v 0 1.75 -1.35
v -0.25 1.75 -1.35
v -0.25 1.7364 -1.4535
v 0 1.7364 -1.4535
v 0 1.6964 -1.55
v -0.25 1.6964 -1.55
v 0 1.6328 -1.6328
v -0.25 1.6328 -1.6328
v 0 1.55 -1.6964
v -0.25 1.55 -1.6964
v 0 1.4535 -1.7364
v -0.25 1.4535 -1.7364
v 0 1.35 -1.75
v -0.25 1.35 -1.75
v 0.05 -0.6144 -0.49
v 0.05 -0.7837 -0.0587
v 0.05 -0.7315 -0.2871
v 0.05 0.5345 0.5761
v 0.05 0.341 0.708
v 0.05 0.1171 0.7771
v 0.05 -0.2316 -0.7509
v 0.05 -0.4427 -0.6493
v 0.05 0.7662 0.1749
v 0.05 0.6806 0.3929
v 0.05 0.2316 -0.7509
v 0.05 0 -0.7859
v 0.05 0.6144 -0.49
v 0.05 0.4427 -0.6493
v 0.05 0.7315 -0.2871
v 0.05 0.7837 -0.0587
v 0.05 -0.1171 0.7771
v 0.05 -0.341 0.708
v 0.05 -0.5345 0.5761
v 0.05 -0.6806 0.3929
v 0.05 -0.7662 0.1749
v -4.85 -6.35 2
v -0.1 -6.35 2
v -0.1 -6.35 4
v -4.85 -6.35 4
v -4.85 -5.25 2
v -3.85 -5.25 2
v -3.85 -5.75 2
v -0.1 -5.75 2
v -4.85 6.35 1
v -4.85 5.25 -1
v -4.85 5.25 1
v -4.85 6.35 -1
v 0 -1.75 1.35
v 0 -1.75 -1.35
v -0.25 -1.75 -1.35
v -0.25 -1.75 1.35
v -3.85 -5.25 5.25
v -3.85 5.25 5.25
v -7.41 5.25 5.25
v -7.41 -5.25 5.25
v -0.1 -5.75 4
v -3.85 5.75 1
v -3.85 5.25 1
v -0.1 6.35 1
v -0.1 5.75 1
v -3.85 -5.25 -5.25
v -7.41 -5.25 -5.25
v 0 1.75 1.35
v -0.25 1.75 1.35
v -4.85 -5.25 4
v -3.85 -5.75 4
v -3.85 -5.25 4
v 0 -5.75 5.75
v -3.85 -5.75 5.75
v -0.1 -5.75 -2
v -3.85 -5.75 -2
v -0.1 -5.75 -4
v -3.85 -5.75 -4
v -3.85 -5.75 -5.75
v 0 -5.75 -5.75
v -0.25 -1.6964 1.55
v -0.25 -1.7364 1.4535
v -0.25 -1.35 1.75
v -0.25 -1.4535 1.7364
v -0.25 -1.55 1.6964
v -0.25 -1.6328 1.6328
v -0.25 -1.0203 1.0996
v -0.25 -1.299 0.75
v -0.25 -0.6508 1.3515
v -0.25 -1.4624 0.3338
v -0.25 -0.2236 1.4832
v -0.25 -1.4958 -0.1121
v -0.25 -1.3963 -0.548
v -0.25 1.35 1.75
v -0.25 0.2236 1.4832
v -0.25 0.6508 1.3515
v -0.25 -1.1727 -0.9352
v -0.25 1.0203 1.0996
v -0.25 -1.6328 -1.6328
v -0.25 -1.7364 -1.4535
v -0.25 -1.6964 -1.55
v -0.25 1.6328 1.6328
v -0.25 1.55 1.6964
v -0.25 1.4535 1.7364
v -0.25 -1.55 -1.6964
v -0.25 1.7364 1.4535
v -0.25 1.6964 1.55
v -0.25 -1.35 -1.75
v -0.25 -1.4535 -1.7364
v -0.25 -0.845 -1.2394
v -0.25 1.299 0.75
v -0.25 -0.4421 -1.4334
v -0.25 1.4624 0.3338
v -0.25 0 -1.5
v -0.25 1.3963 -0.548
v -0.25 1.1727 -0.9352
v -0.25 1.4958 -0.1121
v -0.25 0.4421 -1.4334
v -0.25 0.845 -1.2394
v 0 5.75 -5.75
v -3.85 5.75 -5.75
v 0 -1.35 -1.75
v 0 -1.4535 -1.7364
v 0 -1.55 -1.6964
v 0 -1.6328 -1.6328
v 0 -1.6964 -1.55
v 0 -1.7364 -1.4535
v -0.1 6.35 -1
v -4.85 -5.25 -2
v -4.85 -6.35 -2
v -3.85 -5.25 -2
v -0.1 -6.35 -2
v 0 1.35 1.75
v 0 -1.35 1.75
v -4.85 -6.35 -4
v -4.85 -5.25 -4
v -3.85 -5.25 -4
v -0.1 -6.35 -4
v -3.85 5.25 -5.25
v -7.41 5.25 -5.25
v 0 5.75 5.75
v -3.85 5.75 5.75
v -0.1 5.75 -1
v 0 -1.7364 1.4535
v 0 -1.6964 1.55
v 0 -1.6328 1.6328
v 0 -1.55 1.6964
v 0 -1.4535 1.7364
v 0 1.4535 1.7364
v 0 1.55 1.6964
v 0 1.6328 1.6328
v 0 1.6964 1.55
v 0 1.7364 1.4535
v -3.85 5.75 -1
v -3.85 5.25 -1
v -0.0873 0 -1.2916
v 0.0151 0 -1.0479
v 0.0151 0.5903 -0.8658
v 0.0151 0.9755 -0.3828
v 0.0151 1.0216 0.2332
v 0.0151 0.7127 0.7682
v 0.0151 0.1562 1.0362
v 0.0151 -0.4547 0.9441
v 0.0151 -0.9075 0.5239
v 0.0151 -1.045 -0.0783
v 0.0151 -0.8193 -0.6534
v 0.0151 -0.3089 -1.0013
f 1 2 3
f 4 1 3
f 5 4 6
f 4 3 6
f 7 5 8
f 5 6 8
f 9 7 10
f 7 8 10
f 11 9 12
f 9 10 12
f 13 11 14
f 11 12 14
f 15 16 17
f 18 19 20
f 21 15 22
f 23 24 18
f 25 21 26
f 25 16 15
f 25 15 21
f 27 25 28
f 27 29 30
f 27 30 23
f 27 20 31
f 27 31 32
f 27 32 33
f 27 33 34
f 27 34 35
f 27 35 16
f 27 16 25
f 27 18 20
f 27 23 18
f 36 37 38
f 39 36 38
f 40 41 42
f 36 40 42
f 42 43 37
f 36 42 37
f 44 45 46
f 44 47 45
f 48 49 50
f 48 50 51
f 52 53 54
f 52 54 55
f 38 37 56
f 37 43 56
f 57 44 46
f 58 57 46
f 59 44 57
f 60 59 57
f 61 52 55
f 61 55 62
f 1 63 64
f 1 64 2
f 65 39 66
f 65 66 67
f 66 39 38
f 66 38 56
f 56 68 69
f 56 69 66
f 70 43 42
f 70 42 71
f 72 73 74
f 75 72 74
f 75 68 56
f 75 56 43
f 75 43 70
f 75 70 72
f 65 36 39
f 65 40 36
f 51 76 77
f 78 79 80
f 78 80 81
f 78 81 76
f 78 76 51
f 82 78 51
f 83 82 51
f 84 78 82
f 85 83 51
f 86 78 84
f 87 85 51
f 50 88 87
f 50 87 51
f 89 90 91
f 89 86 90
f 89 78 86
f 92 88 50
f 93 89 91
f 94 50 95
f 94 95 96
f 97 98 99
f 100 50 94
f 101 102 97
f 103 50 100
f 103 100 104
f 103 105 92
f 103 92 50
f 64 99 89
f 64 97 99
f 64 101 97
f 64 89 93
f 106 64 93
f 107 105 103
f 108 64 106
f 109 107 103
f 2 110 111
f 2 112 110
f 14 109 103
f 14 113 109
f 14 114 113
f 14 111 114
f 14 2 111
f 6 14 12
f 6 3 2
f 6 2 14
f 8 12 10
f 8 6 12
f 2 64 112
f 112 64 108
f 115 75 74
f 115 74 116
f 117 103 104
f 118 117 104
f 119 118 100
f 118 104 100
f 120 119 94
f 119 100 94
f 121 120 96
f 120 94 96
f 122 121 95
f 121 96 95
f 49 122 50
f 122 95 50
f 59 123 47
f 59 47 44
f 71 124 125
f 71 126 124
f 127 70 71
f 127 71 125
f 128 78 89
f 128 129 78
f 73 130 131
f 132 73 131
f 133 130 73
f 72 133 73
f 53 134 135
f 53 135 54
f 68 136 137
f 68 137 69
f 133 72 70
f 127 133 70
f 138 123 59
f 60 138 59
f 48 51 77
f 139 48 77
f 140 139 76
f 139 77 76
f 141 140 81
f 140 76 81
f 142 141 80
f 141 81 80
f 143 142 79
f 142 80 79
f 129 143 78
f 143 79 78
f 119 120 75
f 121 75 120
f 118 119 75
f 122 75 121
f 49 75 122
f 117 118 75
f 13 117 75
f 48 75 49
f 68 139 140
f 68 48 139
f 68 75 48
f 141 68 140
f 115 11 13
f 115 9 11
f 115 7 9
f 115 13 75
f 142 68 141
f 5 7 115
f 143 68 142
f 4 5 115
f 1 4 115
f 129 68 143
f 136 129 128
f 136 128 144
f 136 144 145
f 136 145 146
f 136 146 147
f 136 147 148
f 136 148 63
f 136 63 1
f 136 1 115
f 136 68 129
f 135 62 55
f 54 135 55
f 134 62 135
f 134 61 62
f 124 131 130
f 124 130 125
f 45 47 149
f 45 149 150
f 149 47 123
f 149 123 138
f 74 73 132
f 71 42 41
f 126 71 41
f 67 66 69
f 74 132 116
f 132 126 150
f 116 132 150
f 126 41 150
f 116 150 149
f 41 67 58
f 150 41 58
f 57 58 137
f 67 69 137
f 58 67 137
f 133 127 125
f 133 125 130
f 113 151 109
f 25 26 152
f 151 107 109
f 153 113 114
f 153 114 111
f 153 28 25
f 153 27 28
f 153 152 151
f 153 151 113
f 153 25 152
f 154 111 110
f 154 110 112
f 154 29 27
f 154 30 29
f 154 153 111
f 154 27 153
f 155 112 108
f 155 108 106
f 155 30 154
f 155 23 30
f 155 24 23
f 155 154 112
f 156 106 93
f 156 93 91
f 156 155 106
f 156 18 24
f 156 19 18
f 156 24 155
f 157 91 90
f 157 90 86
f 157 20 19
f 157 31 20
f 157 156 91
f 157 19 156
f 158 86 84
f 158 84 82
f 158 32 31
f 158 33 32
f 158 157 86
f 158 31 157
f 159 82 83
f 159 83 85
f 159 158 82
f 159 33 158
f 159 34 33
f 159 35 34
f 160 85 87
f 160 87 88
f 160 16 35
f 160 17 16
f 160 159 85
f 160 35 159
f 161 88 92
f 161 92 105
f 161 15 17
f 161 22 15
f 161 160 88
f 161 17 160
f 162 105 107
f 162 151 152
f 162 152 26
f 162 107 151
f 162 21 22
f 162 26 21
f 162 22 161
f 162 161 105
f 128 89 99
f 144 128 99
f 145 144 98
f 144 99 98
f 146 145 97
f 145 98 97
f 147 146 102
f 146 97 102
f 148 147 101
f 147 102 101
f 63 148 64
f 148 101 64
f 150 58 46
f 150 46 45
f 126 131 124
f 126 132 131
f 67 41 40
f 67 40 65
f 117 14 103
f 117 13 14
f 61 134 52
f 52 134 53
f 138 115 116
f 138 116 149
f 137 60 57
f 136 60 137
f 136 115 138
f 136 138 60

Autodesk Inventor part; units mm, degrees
ref_plane "YZ Plane" through (0, 0, 0) normal (1, 0, 0) x (0, 1, 0)
ref_plane "XZ Plane" through (0, 0, 0) normal (0, 1, 0) x (-1, 0, 0)
ref_plane "XY Plane" through (0, 0, 0) normal (0, 0, 1) x (1, 0, 0)
sketch "Sketch1" plane through (0, 0, 0) normal (1, 0, 0) x (0, 1, 0)
  line L0 (5.75, 5.75) -> (-5.75, 5.75)
  line L1 (-5.75, 5.75) -> (-5.75, -5.75)
  line L2 (-5.75, -5.75) -> (5.75, -5.75)
  line L3 (5.75, -5.75) -> (5.75, 5.75)
  line L4 (5.75, 5.75) -> (-5.75, -5.75) construction
  line L5 (-5.75, 5.75) -> (5.75, -5.75) construction
  point P0 (0, 0)
  dimension "d0" = 11.5
  dimension "d1" = 11.5
extrude "Extrusion1" add sketch "Sketch1" against normal blind 3.85
sketch "Sketch2" plane through (-3.85, 0, 0) normal (-1, 0, 0) x (0, 0, 1)
  line L0 (-5.25, 5.25) -> (5.25, 5.25)
  line L1 (5.25, 5.25) -> (5.25, -5.25)
  line L2 (5.25, -5.25) -> (-5.25, -5.25)
  line L3 (-5.25, -5.25) -> (-5.25, 5.25)
  line L4 (-5.25, 5.25) -> (5.25, -5.25) construction
  line L5 (5.25, 5.25) -> (-5.25, -5.25) construction
  point P0 (0, 0)
  dimension "d4" = 10.5
  dimension "d5" = 10.5
extrude "Extrusion2" add sketch "Sketch2" along normal blind 3.56 separate body
sketch "Sketch3" plane through (-3.85, 0, 0) normal (-1, 0, 0) x (0, 0, 1)
  line L0 (5.75, 5.75) -> (-5.75, 5.75) projected
  line L1 (0, 5.75) -> (0, 5.25) construction
  line L2 (5.25, 5.25) -> (-5.25, 5.25) construction
  line L3 (0, 6.35) -> (-1, 6.35)
  line L4 (-1, 6.35) -> (-1, 5.25)
  line L5 (0, 6.35) -> (1, 6.35)
  line L6 (1, 6.35) -> (1, 5.25)
  line L7 (-1, 5.25) -> (1, 5.25) construction
  line L8 (-5.25, -5.25) -> (5.25, -5.25) projected
  line L9 (-4, -5.25) -> (-2, -5.25)
  line L10 (-2, -5.25) -> (-2, -6.35)
  line L11 (-2, -6.35) -> (-4, -6.35)
  line L12 (-4, -6.35) -> (-4, -5.25)
  line L13 (-5.25, 5.25) -> (-5.25, -5.25) projected
  line L14 (4, -5.25) -> (2, -5.25)
  line L15 (2, -5.25) -> (2, -6.35)
  line L16 (2, -6.35) -> (4, -6.35)
  line L17 (4, -6.35) -> (4, -5.25)
  line L18 (-1, 6.35) -> (1, 6.35)
  line L19 (1, 6.35) -> (1, 5.25)
  line L20 (1, 5.25) -> (-1, 5.25)
  line L21 (-1, 5.25) -> (-1, 6.35)
  point P0 (0, 0)
  dimension "d8" = 1
  dimension "d9" = 1.1
  dimension "d10" = 2
  dimension "d11" = 1.1
  dimension "d12" = 1.25
  dimension "d13" = 12.7
extrude "Extrusion3" add sketch "Sketch3" along normal blind 1 and the other way blind 3.75 bodies 1
sketch "Sketch4" plane through (0, 0, 0) normal (1, 0, 0) x (0, 0, -1)
  line L0 (-1.75, 1.75) -> (1.75, 1.75)
  line L1 (1.75, 1.75) -> (1.75, -1.75)
  line L2 (1.75, -1.75) -> (-1.75, -1.75)
  line L3 (-1.75, -1.75) -> (-1.75, 1.75)
  line L4 (-1.75, 1.75) -> (1.75, -1.75) construction
  line L5 (1.75, 1.75) -> (-1.75, -1.75) construction
  point P0 (0, 0)
  dimension "d18" = 3.5
  dimension "d19" = 3.5
extrude "Extrusion4" cut sketch "Sketch4" against normal blind 0.25 bodies 1
fillet "Fillet1" radius 0.4 4 edges at (-0.125, 1.75, 1.75) (-0.125, 1.75, -1.75) (-0.125, -1.75, 1.75) (-0.125, -1.75, -1.75)
sketch "Sketch5" plane through (-0.25, 0, 0) normal (1, 0, 0) x (0, 0, -1)
  circle A0 centre (0, 0) radius 1.5
  dimension "d23" = 3
extrude "Extrusion5" add sketch "Sketch5" along normal blind 0.3 bodies 1
fillet "Fillet2" radius 1 1 edges at (0.05, 0, 1.5)
properties part number "Thermal module"
